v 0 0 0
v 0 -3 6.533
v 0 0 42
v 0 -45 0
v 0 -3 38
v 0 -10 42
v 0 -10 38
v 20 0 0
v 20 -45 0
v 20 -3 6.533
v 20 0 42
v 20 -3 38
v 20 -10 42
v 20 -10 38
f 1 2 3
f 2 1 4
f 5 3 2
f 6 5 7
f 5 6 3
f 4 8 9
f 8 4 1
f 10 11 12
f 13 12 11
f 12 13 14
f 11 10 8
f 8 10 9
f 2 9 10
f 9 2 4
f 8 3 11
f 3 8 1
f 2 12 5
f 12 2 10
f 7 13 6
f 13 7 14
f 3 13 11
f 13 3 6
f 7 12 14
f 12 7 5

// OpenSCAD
module mount()
{
  polyhedron(
    points = [
               [ 0,  0,  0], // 0
               [ 0,  7,  0], // 1
               [20,  7,  0], // 2
               [20,  0,  0], // 3
               [20,  0, 45], // 4
               [ 0,  0, 45]  // 5
             ],
    faces = [
              // side walls
              [0,1,5],
              [2,3,4],
              // floor
              [2,1,0],
              [3,2,0],
              //back wall
              [4,3,0],
              [5,4,0],
              // front wall
              [1,2,5],
              [2,4,5]
            ]
  );
}


rotate([90, 0, 0])
{
  mount();
  cube([20, 33+5+2, 3]);
  translate([0, 33+5, 0])
    cube([20, 4, 10]);
}
